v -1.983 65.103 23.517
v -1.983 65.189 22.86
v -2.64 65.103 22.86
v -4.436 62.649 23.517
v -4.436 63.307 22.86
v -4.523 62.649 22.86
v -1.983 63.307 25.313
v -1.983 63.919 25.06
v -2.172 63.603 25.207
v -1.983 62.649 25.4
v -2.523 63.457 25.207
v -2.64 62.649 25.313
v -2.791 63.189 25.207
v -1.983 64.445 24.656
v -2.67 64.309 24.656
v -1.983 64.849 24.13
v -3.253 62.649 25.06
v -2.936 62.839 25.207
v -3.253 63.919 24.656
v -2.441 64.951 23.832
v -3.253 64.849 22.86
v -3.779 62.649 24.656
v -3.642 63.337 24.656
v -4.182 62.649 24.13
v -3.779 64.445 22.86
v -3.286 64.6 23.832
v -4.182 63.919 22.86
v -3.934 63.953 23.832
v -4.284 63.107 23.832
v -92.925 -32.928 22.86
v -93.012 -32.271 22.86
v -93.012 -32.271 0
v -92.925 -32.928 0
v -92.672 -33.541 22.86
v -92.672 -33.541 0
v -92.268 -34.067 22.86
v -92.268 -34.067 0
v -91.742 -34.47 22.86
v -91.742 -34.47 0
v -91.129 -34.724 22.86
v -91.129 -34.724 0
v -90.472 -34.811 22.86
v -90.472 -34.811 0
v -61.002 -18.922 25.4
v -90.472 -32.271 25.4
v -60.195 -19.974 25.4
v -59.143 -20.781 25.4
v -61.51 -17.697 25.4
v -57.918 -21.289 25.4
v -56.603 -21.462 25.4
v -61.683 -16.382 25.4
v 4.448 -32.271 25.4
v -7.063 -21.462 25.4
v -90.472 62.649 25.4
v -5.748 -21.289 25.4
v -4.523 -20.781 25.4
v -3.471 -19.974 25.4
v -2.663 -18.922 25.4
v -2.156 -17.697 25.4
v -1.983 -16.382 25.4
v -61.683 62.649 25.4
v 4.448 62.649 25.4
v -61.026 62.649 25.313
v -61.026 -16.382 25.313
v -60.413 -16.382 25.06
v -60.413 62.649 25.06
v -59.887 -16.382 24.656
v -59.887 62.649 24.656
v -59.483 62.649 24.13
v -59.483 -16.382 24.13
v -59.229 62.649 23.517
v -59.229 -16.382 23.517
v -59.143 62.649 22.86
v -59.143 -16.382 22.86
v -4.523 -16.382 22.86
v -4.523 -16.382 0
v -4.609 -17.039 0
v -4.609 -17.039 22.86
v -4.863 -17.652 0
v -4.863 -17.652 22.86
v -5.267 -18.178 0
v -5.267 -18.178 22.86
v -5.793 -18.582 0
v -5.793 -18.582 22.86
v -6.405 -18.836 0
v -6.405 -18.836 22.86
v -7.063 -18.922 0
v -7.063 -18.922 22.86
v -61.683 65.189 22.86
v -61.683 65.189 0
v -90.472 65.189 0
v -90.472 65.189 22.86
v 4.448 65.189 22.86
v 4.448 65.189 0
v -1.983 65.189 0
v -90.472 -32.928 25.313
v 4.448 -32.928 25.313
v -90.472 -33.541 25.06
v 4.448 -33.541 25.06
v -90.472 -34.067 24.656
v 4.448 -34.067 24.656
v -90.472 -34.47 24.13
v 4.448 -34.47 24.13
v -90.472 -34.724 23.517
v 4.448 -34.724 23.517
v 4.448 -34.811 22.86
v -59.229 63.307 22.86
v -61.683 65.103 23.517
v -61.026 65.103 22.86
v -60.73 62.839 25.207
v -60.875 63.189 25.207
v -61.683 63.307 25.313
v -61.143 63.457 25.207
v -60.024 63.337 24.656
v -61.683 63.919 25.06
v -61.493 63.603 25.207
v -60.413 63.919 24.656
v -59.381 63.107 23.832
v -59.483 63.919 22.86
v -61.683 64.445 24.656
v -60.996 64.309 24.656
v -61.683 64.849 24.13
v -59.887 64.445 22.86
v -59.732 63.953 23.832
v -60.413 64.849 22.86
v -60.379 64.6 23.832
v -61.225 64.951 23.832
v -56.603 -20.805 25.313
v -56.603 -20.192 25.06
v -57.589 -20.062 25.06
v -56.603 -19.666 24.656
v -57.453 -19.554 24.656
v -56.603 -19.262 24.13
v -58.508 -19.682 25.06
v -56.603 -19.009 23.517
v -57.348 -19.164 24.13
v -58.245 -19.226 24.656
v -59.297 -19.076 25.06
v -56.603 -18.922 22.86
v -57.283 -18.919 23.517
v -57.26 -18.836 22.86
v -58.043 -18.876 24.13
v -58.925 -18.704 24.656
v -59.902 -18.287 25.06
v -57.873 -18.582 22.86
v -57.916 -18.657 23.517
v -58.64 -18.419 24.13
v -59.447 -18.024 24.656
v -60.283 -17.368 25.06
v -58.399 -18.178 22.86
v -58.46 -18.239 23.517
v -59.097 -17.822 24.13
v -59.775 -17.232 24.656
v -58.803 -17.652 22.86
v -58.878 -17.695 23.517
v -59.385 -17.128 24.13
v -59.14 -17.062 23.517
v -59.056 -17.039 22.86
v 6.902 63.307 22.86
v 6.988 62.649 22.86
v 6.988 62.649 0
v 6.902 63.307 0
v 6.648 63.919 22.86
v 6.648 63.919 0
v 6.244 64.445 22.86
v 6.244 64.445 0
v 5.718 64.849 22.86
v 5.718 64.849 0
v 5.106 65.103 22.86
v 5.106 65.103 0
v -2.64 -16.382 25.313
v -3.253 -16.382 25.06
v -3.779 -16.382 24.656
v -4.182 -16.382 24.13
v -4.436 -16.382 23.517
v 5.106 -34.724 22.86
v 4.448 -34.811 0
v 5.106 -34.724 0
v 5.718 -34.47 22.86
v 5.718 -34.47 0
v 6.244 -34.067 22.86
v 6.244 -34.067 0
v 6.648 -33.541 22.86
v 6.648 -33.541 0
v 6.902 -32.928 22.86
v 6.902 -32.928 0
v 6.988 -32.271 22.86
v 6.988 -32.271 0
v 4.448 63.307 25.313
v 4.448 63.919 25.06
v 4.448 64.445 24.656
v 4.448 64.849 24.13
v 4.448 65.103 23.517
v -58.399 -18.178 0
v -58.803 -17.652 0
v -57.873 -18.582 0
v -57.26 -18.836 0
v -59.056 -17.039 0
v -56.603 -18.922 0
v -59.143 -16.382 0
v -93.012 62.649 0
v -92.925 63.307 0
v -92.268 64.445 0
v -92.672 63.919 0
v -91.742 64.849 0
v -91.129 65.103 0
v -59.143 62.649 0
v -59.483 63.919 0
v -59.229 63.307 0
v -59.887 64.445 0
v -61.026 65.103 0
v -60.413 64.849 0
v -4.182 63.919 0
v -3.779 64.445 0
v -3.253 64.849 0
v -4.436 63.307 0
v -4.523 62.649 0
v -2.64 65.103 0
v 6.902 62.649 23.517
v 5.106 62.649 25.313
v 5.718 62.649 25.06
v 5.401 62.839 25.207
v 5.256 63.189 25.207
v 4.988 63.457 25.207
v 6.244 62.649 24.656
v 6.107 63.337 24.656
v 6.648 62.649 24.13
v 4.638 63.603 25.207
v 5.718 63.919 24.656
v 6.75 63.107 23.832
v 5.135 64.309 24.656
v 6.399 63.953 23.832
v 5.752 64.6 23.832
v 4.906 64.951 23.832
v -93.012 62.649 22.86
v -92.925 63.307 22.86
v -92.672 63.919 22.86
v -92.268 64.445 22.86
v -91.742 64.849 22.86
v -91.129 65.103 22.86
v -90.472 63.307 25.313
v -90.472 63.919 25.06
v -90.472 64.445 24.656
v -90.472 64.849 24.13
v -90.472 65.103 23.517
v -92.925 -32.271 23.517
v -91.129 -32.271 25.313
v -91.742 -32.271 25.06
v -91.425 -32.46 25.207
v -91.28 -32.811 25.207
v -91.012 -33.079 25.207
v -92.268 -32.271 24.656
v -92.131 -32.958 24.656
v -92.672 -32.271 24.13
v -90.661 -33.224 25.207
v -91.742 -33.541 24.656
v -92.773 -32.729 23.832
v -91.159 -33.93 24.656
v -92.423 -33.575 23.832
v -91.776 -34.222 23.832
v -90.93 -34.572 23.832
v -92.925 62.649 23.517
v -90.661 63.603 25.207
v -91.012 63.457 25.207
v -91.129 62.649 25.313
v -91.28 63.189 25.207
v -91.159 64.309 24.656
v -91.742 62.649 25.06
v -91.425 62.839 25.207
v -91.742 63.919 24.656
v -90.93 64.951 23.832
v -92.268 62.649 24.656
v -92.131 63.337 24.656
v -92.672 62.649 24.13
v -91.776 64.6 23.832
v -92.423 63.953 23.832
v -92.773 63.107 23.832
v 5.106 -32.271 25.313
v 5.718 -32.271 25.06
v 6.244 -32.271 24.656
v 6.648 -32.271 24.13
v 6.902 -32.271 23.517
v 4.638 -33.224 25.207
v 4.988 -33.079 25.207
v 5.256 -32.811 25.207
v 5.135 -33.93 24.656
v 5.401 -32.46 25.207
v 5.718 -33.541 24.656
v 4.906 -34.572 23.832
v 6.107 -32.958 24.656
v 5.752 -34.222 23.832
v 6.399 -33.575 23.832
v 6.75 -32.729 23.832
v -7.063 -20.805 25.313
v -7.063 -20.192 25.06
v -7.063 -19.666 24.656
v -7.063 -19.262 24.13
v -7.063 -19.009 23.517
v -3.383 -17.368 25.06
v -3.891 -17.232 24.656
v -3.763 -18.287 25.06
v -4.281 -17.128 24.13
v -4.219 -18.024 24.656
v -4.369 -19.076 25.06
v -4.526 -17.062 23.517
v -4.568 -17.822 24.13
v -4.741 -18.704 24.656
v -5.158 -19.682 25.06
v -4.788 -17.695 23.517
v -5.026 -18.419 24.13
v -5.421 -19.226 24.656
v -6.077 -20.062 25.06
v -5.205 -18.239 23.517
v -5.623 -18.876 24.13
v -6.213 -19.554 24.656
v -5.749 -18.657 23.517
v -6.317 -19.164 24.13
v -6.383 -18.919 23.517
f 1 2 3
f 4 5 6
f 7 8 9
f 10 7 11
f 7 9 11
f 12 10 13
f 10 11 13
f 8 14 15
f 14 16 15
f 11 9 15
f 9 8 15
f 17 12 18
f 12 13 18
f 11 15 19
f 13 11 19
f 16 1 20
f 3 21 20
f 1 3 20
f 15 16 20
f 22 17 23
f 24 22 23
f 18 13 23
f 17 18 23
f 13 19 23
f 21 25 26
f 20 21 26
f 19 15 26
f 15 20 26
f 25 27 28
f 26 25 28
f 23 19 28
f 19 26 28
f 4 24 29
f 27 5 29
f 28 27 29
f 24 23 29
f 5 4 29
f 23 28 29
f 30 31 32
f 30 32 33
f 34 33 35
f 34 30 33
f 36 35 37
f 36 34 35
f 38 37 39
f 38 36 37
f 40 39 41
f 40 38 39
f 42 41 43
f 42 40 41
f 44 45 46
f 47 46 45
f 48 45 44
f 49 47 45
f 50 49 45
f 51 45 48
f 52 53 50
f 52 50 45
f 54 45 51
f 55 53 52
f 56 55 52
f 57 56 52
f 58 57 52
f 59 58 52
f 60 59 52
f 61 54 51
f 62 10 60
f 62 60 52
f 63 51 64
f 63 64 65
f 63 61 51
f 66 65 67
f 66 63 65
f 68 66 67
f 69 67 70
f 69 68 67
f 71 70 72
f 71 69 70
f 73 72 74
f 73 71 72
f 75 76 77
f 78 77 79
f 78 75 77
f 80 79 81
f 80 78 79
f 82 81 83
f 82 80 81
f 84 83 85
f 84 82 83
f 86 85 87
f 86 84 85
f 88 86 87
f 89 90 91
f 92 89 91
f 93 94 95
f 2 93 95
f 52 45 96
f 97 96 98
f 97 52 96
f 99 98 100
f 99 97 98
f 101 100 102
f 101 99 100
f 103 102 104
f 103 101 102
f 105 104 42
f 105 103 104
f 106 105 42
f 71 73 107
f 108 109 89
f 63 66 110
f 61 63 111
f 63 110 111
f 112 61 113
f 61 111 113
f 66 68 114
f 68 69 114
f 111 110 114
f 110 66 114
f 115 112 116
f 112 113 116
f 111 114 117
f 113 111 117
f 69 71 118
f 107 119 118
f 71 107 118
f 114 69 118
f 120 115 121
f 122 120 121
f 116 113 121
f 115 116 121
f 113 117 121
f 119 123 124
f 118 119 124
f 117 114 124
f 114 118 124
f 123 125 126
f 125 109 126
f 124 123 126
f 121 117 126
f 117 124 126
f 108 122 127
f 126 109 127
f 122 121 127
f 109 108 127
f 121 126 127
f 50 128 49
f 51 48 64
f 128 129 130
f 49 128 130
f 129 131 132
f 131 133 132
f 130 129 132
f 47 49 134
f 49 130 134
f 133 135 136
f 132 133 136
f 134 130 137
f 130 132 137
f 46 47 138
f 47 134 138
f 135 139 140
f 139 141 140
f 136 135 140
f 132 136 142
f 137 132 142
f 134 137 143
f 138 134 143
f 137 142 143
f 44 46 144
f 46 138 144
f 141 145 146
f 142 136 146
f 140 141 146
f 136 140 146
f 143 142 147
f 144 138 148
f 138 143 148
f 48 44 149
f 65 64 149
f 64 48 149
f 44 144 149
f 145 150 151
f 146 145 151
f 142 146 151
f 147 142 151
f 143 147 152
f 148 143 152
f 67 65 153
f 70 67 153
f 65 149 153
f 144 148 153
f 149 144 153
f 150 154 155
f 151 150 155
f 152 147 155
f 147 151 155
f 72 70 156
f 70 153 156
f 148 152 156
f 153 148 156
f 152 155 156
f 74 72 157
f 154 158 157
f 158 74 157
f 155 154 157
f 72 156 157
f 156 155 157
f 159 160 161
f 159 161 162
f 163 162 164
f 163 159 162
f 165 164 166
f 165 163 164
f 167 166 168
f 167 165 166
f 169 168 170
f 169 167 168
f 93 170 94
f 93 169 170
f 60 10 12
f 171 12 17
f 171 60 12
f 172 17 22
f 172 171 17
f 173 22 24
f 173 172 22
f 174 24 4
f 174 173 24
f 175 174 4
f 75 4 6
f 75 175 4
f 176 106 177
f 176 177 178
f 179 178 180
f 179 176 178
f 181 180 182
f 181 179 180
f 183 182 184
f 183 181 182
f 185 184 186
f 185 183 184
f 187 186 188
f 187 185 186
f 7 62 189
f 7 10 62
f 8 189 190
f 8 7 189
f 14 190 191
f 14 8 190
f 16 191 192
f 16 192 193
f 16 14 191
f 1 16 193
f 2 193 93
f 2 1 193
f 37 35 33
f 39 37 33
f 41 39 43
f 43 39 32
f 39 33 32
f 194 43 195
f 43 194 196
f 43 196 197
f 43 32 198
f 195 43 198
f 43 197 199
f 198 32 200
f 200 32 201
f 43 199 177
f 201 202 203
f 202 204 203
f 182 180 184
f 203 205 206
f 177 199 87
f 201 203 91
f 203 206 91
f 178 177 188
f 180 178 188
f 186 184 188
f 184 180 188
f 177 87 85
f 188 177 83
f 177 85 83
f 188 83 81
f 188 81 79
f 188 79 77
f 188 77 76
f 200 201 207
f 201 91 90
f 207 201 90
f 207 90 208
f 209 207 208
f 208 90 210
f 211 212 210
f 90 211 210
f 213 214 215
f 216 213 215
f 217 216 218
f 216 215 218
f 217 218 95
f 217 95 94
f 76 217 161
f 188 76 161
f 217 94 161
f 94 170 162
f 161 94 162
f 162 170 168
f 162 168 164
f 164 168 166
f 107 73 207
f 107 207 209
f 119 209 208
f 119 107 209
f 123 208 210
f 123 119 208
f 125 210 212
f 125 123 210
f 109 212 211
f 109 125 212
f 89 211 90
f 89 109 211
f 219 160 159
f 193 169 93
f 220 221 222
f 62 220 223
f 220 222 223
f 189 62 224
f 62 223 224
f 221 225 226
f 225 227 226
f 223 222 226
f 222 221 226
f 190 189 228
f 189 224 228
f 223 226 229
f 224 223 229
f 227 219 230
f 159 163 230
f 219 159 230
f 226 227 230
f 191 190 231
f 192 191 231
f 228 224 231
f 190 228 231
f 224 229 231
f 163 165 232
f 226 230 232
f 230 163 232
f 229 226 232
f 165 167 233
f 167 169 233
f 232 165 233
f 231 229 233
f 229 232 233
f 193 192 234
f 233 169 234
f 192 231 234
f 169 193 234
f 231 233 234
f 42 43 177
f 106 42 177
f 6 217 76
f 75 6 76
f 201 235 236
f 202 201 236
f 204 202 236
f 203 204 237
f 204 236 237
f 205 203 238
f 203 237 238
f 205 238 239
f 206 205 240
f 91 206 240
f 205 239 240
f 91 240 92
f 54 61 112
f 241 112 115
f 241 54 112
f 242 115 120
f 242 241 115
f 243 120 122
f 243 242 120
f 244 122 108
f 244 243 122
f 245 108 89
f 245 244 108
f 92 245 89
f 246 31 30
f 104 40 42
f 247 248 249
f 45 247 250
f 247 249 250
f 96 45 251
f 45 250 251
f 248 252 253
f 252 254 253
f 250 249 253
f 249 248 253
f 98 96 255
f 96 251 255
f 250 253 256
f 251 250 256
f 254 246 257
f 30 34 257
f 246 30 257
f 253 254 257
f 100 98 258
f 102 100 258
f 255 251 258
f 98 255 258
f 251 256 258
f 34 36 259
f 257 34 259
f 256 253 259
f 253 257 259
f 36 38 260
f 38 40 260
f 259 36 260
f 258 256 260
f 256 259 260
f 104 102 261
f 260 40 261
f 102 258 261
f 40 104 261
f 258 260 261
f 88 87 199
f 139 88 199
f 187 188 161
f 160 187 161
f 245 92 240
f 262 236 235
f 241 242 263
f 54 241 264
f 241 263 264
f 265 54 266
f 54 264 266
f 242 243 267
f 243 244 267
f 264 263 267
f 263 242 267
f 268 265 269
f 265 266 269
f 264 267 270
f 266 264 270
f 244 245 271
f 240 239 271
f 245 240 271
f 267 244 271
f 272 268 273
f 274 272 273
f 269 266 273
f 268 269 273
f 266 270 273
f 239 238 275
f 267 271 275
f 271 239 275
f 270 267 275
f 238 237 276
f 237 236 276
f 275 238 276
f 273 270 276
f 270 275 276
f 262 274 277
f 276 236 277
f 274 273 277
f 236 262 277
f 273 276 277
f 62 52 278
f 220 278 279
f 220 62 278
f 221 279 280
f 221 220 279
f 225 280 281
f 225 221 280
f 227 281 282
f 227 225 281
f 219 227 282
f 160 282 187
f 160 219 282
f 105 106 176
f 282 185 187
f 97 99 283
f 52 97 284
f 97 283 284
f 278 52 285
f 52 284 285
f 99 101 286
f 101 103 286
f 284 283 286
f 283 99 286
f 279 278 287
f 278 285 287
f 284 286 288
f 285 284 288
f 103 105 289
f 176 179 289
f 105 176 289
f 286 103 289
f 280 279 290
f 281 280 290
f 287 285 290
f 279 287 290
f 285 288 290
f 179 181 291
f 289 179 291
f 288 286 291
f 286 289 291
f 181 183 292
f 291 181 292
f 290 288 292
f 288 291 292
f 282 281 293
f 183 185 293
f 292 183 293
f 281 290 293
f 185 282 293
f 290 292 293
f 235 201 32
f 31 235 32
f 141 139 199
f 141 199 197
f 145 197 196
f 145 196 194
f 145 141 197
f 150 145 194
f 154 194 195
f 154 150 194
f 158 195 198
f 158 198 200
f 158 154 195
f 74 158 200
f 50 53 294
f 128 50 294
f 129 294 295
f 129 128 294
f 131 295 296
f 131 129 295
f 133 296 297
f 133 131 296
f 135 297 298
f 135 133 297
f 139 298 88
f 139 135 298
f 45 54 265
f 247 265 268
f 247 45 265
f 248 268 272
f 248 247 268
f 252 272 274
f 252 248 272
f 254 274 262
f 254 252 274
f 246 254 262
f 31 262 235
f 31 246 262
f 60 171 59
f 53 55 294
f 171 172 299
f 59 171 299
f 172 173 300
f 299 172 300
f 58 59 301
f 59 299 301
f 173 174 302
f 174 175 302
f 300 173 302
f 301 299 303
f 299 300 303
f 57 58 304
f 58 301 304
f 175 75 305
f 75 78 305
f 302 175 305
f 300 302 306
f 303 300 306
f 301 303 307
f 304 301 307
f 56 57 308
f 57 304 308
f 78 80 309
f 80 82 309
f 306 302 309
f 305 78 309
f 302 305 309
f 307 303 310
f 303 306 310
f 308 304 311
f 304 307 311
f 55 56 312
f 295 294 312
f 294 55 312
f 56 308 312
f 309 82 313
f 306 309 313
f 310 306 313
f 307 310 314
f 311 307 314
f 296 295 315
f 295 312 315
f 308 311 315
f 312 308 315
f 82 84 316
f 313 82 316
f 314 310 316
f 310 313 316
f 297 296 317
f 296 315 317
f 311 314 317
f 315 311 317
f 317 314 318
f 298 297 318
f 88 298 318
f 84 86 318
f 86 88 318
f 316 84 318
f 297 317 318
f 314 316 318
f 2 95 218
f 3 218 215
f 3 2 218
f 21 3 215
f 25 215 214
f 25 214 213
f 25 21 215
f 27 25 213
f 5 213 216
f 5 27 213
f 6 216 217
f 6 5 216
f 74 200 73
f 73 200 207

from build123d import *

# Parameters (mm, degrees)
F1_DEPTH = 25.4
F2_R     = 2.54
F3_R     = 2.54


with BuildPart() as f1:
    # F0 (on Top) → F1 (new body)
    with BuildSketch(Plane.XY):
        Polygon((-93.011853, 65.189209), (-93.011853, -34.810791), (6.988147, -34.810791), (6.988147, 65.189209), (-4.522704, 65.189209), (-4.522704, -18.92205), (-59.142936, -18.92205), (-59.142936, 65.189209), align=None)
    extrude(amount=F1_DEPTH)

    # F2
    f2_edges = [f1.edges().sort_by_distance(p)[0] for p in [
        (-93.011853, -34.810791, 12.7),
        (6.988147, -34.810791, 12.7),
        (-4.522704, -18.92205, 12.7),
        (-59.142936, -18.92205, 12.7),
        (-59.142936, 65.189209, 12.7),
        (-93.011853, 65.189209, 12.7),
        (6.988147, 65.189209, 12.7),
        (-4.522704, 65.189209, 12.7),
    ]]
    fillet(f2_edges, radius=F2_R)

    # F3
    f3_edges = [f1.edges().sort_by_distance(p)[0] for p in [
        (1.232722, 65.189209, 25.4),
        (6.244199, 64.445261, 25.4),
        (-3.778755, 64.445261, 25.4),
        (6.988147, 15.189209, 25.4),
        (-4.522704, 23.13358, 25.4),
        (6.244199, -34.066842, 25.4),
        (-5.266652, -18.178101, 25.4),
        (-43.011853, -34.810791, 25.4),
        (-31.83282, -18.92205, 25.4),
        (-92.267904, -34.066842, 25.4),
        (-58.398987, -18.178101, 25.4),
        (-93.011853, 15.189209, 25.4),
        (-59.142936, 23.13358, 25.4),
        (-92.267904, 64.445261, 25.4),
        (-59.886885, 64.445261, 25.4),
        (-76.077394, 65.189209, 25.4),
    ]]
    fillet(f3_edges, radius=F3_R)


solid = f1.part
